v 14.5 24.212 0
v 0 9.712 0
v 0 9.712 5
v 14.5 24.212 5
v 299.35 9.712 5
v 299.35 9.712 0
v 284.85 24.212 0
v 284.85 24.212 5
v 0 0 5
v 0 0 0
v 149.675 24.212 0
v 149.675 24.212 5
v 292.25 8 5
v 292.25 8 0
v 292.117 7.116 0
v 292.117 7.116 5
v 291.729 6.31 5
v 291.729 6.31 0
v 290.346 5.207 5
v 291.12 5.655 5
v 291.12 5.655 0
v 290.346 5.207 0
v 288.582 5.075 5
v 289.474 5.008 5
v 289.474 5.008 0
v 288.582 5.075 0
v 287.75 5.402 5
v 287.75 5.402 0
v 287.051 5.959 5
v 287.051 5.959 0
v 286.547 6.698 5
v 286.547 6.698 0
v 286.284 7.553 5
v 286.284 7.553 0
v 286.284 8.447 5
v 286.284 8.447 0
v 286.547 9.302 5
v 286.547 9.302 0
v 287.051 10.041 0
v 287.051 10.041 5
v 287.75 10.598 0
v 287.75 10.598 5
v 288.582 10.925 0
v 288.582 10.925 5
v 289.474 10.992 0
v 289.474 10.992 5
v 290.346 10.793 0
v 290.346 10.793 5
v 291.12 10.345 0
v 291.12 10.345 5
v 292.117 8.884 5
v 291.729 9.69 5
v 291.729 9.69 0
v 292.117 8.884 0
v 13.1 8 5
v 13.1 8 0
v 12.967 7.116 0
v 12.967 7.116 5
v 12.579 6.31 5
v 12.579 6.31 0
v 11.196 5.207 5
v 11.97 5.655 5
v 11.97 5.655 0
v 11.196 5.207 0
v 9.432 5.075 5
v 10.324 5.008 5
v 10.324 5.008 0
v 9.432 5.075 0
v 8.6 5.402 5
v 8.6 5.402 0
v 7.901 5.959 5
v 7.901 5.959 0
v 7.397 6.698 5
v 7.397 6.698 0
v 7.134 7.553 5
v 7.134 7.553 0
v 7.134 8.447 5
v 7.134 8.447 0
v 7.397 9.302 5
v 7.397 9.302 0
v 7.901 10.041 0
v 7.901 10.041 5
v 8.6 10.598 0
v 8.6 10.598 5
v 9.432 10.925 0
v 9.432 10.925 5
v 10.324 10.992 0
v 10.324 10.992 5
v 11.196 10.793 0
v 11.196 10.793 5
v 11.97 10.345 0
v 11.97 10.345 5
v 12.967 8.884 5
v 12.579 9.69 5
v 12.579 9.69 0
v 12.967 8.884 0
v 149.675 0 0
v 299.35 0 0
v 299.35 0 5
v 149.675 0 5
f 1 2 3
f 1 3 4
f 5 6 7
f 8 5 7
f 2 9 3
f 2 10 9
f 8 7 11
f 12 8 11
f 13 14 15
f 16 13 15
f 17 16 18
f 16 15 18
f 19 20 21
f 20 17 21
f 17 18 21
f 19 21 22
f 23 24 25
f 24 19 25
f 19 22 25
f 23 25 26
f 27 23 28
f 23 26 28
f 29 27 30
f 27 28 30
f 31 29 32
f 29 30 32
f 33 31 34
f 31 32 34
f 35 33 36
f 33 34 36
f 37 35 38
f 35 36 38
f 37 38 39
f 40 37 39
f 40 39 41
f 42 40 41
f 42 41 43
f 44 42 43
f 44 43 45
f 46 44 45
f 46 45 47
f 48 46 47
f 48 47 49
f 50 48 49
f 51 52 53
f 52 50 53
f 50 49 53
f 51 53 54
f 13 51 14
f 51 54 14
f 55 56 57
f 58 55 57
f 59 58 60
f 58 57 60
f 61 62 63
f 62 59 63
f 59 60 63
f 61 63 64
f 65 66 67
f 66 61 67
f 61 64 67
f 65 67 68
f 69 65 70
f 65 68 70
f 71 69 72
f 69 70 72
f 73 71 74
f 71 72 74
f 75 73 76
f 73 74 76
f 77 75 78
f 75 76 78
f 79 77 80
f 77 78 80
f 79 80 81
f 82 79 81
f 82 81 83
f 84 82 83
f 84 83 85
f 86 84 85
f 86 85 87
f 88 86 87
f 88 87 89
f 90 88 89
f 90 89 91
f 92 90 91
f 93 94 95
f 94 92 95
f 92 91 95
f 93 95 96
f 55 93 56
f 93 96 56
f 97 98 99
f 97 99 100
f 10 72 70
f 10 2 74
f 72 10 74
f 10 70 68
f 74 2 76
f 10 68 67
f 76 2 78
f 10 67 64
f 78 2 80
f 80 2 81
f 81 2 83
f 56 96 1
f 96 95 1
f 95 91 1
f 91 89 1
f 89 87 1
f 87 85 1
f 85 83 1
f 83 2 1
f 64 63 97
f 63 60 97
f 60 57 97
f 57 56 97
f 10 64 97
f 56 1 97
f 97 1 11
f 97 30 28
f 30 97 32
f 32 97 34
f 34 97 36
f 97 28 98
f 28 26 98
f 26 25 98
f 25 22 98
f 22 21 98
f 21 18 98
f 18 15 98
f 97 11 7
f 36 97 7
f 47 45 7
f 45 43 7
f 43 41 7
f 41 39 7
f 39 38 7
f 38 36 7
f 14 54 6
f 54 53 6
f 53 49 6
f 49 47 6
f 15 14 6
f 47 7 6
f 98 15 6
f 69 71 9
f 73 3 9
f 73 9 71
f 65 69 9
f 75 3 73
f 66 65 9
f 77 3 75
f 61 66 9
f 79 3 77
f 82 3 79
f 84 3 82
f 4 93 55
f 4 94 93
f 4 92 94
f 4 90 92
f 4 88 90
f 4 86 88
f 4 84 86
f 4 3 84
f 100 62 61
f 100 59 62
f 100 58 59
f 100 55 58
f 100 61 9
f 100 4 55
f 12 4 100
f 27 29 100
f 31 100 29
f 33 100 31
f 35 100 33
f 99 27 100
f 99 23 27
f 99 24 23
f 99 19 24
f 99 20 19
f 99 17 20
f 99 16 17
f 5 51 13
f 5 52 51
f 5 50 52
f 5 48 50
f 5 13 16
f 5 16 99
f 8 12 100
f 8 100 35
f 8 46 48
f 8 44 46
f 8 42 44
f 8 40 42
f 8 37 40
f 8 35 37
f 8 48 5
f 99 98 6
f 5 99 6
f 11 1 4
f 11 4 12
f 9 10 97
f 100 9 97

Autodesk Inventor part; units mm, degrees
ref_plane "YZ Plane" through (0, 0, 0) normal (1, 0, 0) x (0, 1, 0)
ref_plane "XZ Plane" through (0, 0, 0) normal (0, 1, 0) x (-1, 0, 0)
ref_plane "XY Plane" through (0, 0, 0) normal (0, 0, 1) x (1, 0, 0)
sketch "Sketch1" plane through (0, 0, 0) normal (0, 0, 1) x (1, 0, 0)
  line L0 (0, 0) -> (0, 9.712)
  line L1 (0, 9.712) -> (14.5, 24.212)
  line L2 (14.5, 24.212) -> (149.675, 24.212)
  line L3 (0, 0) -> (149.675, 0)
  circle A0 centre (10.1, 8) radius 3
  line L4 (149.675, 42.0637) -> (149.675, 59.6175)
  line L5 (299.35, 0) -> (299.35, 9.712)
  line L6 (299.35, 9.712) -> (284.85, 24.212)
  line L7 (284.85, 24.212) -> (149.675, 24.212)
  line L8 (299.35, 0) -> (149.675, 0)
  circle A1 centre (289.25, 8) radius 3
  dimension "d0" = 135
  dimension "d1" = 149.675
  dimension "d2" = 9.712
  dimension "d3" = 24.212
  dimension "d4" = 6
  dimension "d5" = 8
  dimension "d6" = 10.1
extrude "Extrusion1" add sketch "Sketch1" along normal blind 5
properties part number "road"
